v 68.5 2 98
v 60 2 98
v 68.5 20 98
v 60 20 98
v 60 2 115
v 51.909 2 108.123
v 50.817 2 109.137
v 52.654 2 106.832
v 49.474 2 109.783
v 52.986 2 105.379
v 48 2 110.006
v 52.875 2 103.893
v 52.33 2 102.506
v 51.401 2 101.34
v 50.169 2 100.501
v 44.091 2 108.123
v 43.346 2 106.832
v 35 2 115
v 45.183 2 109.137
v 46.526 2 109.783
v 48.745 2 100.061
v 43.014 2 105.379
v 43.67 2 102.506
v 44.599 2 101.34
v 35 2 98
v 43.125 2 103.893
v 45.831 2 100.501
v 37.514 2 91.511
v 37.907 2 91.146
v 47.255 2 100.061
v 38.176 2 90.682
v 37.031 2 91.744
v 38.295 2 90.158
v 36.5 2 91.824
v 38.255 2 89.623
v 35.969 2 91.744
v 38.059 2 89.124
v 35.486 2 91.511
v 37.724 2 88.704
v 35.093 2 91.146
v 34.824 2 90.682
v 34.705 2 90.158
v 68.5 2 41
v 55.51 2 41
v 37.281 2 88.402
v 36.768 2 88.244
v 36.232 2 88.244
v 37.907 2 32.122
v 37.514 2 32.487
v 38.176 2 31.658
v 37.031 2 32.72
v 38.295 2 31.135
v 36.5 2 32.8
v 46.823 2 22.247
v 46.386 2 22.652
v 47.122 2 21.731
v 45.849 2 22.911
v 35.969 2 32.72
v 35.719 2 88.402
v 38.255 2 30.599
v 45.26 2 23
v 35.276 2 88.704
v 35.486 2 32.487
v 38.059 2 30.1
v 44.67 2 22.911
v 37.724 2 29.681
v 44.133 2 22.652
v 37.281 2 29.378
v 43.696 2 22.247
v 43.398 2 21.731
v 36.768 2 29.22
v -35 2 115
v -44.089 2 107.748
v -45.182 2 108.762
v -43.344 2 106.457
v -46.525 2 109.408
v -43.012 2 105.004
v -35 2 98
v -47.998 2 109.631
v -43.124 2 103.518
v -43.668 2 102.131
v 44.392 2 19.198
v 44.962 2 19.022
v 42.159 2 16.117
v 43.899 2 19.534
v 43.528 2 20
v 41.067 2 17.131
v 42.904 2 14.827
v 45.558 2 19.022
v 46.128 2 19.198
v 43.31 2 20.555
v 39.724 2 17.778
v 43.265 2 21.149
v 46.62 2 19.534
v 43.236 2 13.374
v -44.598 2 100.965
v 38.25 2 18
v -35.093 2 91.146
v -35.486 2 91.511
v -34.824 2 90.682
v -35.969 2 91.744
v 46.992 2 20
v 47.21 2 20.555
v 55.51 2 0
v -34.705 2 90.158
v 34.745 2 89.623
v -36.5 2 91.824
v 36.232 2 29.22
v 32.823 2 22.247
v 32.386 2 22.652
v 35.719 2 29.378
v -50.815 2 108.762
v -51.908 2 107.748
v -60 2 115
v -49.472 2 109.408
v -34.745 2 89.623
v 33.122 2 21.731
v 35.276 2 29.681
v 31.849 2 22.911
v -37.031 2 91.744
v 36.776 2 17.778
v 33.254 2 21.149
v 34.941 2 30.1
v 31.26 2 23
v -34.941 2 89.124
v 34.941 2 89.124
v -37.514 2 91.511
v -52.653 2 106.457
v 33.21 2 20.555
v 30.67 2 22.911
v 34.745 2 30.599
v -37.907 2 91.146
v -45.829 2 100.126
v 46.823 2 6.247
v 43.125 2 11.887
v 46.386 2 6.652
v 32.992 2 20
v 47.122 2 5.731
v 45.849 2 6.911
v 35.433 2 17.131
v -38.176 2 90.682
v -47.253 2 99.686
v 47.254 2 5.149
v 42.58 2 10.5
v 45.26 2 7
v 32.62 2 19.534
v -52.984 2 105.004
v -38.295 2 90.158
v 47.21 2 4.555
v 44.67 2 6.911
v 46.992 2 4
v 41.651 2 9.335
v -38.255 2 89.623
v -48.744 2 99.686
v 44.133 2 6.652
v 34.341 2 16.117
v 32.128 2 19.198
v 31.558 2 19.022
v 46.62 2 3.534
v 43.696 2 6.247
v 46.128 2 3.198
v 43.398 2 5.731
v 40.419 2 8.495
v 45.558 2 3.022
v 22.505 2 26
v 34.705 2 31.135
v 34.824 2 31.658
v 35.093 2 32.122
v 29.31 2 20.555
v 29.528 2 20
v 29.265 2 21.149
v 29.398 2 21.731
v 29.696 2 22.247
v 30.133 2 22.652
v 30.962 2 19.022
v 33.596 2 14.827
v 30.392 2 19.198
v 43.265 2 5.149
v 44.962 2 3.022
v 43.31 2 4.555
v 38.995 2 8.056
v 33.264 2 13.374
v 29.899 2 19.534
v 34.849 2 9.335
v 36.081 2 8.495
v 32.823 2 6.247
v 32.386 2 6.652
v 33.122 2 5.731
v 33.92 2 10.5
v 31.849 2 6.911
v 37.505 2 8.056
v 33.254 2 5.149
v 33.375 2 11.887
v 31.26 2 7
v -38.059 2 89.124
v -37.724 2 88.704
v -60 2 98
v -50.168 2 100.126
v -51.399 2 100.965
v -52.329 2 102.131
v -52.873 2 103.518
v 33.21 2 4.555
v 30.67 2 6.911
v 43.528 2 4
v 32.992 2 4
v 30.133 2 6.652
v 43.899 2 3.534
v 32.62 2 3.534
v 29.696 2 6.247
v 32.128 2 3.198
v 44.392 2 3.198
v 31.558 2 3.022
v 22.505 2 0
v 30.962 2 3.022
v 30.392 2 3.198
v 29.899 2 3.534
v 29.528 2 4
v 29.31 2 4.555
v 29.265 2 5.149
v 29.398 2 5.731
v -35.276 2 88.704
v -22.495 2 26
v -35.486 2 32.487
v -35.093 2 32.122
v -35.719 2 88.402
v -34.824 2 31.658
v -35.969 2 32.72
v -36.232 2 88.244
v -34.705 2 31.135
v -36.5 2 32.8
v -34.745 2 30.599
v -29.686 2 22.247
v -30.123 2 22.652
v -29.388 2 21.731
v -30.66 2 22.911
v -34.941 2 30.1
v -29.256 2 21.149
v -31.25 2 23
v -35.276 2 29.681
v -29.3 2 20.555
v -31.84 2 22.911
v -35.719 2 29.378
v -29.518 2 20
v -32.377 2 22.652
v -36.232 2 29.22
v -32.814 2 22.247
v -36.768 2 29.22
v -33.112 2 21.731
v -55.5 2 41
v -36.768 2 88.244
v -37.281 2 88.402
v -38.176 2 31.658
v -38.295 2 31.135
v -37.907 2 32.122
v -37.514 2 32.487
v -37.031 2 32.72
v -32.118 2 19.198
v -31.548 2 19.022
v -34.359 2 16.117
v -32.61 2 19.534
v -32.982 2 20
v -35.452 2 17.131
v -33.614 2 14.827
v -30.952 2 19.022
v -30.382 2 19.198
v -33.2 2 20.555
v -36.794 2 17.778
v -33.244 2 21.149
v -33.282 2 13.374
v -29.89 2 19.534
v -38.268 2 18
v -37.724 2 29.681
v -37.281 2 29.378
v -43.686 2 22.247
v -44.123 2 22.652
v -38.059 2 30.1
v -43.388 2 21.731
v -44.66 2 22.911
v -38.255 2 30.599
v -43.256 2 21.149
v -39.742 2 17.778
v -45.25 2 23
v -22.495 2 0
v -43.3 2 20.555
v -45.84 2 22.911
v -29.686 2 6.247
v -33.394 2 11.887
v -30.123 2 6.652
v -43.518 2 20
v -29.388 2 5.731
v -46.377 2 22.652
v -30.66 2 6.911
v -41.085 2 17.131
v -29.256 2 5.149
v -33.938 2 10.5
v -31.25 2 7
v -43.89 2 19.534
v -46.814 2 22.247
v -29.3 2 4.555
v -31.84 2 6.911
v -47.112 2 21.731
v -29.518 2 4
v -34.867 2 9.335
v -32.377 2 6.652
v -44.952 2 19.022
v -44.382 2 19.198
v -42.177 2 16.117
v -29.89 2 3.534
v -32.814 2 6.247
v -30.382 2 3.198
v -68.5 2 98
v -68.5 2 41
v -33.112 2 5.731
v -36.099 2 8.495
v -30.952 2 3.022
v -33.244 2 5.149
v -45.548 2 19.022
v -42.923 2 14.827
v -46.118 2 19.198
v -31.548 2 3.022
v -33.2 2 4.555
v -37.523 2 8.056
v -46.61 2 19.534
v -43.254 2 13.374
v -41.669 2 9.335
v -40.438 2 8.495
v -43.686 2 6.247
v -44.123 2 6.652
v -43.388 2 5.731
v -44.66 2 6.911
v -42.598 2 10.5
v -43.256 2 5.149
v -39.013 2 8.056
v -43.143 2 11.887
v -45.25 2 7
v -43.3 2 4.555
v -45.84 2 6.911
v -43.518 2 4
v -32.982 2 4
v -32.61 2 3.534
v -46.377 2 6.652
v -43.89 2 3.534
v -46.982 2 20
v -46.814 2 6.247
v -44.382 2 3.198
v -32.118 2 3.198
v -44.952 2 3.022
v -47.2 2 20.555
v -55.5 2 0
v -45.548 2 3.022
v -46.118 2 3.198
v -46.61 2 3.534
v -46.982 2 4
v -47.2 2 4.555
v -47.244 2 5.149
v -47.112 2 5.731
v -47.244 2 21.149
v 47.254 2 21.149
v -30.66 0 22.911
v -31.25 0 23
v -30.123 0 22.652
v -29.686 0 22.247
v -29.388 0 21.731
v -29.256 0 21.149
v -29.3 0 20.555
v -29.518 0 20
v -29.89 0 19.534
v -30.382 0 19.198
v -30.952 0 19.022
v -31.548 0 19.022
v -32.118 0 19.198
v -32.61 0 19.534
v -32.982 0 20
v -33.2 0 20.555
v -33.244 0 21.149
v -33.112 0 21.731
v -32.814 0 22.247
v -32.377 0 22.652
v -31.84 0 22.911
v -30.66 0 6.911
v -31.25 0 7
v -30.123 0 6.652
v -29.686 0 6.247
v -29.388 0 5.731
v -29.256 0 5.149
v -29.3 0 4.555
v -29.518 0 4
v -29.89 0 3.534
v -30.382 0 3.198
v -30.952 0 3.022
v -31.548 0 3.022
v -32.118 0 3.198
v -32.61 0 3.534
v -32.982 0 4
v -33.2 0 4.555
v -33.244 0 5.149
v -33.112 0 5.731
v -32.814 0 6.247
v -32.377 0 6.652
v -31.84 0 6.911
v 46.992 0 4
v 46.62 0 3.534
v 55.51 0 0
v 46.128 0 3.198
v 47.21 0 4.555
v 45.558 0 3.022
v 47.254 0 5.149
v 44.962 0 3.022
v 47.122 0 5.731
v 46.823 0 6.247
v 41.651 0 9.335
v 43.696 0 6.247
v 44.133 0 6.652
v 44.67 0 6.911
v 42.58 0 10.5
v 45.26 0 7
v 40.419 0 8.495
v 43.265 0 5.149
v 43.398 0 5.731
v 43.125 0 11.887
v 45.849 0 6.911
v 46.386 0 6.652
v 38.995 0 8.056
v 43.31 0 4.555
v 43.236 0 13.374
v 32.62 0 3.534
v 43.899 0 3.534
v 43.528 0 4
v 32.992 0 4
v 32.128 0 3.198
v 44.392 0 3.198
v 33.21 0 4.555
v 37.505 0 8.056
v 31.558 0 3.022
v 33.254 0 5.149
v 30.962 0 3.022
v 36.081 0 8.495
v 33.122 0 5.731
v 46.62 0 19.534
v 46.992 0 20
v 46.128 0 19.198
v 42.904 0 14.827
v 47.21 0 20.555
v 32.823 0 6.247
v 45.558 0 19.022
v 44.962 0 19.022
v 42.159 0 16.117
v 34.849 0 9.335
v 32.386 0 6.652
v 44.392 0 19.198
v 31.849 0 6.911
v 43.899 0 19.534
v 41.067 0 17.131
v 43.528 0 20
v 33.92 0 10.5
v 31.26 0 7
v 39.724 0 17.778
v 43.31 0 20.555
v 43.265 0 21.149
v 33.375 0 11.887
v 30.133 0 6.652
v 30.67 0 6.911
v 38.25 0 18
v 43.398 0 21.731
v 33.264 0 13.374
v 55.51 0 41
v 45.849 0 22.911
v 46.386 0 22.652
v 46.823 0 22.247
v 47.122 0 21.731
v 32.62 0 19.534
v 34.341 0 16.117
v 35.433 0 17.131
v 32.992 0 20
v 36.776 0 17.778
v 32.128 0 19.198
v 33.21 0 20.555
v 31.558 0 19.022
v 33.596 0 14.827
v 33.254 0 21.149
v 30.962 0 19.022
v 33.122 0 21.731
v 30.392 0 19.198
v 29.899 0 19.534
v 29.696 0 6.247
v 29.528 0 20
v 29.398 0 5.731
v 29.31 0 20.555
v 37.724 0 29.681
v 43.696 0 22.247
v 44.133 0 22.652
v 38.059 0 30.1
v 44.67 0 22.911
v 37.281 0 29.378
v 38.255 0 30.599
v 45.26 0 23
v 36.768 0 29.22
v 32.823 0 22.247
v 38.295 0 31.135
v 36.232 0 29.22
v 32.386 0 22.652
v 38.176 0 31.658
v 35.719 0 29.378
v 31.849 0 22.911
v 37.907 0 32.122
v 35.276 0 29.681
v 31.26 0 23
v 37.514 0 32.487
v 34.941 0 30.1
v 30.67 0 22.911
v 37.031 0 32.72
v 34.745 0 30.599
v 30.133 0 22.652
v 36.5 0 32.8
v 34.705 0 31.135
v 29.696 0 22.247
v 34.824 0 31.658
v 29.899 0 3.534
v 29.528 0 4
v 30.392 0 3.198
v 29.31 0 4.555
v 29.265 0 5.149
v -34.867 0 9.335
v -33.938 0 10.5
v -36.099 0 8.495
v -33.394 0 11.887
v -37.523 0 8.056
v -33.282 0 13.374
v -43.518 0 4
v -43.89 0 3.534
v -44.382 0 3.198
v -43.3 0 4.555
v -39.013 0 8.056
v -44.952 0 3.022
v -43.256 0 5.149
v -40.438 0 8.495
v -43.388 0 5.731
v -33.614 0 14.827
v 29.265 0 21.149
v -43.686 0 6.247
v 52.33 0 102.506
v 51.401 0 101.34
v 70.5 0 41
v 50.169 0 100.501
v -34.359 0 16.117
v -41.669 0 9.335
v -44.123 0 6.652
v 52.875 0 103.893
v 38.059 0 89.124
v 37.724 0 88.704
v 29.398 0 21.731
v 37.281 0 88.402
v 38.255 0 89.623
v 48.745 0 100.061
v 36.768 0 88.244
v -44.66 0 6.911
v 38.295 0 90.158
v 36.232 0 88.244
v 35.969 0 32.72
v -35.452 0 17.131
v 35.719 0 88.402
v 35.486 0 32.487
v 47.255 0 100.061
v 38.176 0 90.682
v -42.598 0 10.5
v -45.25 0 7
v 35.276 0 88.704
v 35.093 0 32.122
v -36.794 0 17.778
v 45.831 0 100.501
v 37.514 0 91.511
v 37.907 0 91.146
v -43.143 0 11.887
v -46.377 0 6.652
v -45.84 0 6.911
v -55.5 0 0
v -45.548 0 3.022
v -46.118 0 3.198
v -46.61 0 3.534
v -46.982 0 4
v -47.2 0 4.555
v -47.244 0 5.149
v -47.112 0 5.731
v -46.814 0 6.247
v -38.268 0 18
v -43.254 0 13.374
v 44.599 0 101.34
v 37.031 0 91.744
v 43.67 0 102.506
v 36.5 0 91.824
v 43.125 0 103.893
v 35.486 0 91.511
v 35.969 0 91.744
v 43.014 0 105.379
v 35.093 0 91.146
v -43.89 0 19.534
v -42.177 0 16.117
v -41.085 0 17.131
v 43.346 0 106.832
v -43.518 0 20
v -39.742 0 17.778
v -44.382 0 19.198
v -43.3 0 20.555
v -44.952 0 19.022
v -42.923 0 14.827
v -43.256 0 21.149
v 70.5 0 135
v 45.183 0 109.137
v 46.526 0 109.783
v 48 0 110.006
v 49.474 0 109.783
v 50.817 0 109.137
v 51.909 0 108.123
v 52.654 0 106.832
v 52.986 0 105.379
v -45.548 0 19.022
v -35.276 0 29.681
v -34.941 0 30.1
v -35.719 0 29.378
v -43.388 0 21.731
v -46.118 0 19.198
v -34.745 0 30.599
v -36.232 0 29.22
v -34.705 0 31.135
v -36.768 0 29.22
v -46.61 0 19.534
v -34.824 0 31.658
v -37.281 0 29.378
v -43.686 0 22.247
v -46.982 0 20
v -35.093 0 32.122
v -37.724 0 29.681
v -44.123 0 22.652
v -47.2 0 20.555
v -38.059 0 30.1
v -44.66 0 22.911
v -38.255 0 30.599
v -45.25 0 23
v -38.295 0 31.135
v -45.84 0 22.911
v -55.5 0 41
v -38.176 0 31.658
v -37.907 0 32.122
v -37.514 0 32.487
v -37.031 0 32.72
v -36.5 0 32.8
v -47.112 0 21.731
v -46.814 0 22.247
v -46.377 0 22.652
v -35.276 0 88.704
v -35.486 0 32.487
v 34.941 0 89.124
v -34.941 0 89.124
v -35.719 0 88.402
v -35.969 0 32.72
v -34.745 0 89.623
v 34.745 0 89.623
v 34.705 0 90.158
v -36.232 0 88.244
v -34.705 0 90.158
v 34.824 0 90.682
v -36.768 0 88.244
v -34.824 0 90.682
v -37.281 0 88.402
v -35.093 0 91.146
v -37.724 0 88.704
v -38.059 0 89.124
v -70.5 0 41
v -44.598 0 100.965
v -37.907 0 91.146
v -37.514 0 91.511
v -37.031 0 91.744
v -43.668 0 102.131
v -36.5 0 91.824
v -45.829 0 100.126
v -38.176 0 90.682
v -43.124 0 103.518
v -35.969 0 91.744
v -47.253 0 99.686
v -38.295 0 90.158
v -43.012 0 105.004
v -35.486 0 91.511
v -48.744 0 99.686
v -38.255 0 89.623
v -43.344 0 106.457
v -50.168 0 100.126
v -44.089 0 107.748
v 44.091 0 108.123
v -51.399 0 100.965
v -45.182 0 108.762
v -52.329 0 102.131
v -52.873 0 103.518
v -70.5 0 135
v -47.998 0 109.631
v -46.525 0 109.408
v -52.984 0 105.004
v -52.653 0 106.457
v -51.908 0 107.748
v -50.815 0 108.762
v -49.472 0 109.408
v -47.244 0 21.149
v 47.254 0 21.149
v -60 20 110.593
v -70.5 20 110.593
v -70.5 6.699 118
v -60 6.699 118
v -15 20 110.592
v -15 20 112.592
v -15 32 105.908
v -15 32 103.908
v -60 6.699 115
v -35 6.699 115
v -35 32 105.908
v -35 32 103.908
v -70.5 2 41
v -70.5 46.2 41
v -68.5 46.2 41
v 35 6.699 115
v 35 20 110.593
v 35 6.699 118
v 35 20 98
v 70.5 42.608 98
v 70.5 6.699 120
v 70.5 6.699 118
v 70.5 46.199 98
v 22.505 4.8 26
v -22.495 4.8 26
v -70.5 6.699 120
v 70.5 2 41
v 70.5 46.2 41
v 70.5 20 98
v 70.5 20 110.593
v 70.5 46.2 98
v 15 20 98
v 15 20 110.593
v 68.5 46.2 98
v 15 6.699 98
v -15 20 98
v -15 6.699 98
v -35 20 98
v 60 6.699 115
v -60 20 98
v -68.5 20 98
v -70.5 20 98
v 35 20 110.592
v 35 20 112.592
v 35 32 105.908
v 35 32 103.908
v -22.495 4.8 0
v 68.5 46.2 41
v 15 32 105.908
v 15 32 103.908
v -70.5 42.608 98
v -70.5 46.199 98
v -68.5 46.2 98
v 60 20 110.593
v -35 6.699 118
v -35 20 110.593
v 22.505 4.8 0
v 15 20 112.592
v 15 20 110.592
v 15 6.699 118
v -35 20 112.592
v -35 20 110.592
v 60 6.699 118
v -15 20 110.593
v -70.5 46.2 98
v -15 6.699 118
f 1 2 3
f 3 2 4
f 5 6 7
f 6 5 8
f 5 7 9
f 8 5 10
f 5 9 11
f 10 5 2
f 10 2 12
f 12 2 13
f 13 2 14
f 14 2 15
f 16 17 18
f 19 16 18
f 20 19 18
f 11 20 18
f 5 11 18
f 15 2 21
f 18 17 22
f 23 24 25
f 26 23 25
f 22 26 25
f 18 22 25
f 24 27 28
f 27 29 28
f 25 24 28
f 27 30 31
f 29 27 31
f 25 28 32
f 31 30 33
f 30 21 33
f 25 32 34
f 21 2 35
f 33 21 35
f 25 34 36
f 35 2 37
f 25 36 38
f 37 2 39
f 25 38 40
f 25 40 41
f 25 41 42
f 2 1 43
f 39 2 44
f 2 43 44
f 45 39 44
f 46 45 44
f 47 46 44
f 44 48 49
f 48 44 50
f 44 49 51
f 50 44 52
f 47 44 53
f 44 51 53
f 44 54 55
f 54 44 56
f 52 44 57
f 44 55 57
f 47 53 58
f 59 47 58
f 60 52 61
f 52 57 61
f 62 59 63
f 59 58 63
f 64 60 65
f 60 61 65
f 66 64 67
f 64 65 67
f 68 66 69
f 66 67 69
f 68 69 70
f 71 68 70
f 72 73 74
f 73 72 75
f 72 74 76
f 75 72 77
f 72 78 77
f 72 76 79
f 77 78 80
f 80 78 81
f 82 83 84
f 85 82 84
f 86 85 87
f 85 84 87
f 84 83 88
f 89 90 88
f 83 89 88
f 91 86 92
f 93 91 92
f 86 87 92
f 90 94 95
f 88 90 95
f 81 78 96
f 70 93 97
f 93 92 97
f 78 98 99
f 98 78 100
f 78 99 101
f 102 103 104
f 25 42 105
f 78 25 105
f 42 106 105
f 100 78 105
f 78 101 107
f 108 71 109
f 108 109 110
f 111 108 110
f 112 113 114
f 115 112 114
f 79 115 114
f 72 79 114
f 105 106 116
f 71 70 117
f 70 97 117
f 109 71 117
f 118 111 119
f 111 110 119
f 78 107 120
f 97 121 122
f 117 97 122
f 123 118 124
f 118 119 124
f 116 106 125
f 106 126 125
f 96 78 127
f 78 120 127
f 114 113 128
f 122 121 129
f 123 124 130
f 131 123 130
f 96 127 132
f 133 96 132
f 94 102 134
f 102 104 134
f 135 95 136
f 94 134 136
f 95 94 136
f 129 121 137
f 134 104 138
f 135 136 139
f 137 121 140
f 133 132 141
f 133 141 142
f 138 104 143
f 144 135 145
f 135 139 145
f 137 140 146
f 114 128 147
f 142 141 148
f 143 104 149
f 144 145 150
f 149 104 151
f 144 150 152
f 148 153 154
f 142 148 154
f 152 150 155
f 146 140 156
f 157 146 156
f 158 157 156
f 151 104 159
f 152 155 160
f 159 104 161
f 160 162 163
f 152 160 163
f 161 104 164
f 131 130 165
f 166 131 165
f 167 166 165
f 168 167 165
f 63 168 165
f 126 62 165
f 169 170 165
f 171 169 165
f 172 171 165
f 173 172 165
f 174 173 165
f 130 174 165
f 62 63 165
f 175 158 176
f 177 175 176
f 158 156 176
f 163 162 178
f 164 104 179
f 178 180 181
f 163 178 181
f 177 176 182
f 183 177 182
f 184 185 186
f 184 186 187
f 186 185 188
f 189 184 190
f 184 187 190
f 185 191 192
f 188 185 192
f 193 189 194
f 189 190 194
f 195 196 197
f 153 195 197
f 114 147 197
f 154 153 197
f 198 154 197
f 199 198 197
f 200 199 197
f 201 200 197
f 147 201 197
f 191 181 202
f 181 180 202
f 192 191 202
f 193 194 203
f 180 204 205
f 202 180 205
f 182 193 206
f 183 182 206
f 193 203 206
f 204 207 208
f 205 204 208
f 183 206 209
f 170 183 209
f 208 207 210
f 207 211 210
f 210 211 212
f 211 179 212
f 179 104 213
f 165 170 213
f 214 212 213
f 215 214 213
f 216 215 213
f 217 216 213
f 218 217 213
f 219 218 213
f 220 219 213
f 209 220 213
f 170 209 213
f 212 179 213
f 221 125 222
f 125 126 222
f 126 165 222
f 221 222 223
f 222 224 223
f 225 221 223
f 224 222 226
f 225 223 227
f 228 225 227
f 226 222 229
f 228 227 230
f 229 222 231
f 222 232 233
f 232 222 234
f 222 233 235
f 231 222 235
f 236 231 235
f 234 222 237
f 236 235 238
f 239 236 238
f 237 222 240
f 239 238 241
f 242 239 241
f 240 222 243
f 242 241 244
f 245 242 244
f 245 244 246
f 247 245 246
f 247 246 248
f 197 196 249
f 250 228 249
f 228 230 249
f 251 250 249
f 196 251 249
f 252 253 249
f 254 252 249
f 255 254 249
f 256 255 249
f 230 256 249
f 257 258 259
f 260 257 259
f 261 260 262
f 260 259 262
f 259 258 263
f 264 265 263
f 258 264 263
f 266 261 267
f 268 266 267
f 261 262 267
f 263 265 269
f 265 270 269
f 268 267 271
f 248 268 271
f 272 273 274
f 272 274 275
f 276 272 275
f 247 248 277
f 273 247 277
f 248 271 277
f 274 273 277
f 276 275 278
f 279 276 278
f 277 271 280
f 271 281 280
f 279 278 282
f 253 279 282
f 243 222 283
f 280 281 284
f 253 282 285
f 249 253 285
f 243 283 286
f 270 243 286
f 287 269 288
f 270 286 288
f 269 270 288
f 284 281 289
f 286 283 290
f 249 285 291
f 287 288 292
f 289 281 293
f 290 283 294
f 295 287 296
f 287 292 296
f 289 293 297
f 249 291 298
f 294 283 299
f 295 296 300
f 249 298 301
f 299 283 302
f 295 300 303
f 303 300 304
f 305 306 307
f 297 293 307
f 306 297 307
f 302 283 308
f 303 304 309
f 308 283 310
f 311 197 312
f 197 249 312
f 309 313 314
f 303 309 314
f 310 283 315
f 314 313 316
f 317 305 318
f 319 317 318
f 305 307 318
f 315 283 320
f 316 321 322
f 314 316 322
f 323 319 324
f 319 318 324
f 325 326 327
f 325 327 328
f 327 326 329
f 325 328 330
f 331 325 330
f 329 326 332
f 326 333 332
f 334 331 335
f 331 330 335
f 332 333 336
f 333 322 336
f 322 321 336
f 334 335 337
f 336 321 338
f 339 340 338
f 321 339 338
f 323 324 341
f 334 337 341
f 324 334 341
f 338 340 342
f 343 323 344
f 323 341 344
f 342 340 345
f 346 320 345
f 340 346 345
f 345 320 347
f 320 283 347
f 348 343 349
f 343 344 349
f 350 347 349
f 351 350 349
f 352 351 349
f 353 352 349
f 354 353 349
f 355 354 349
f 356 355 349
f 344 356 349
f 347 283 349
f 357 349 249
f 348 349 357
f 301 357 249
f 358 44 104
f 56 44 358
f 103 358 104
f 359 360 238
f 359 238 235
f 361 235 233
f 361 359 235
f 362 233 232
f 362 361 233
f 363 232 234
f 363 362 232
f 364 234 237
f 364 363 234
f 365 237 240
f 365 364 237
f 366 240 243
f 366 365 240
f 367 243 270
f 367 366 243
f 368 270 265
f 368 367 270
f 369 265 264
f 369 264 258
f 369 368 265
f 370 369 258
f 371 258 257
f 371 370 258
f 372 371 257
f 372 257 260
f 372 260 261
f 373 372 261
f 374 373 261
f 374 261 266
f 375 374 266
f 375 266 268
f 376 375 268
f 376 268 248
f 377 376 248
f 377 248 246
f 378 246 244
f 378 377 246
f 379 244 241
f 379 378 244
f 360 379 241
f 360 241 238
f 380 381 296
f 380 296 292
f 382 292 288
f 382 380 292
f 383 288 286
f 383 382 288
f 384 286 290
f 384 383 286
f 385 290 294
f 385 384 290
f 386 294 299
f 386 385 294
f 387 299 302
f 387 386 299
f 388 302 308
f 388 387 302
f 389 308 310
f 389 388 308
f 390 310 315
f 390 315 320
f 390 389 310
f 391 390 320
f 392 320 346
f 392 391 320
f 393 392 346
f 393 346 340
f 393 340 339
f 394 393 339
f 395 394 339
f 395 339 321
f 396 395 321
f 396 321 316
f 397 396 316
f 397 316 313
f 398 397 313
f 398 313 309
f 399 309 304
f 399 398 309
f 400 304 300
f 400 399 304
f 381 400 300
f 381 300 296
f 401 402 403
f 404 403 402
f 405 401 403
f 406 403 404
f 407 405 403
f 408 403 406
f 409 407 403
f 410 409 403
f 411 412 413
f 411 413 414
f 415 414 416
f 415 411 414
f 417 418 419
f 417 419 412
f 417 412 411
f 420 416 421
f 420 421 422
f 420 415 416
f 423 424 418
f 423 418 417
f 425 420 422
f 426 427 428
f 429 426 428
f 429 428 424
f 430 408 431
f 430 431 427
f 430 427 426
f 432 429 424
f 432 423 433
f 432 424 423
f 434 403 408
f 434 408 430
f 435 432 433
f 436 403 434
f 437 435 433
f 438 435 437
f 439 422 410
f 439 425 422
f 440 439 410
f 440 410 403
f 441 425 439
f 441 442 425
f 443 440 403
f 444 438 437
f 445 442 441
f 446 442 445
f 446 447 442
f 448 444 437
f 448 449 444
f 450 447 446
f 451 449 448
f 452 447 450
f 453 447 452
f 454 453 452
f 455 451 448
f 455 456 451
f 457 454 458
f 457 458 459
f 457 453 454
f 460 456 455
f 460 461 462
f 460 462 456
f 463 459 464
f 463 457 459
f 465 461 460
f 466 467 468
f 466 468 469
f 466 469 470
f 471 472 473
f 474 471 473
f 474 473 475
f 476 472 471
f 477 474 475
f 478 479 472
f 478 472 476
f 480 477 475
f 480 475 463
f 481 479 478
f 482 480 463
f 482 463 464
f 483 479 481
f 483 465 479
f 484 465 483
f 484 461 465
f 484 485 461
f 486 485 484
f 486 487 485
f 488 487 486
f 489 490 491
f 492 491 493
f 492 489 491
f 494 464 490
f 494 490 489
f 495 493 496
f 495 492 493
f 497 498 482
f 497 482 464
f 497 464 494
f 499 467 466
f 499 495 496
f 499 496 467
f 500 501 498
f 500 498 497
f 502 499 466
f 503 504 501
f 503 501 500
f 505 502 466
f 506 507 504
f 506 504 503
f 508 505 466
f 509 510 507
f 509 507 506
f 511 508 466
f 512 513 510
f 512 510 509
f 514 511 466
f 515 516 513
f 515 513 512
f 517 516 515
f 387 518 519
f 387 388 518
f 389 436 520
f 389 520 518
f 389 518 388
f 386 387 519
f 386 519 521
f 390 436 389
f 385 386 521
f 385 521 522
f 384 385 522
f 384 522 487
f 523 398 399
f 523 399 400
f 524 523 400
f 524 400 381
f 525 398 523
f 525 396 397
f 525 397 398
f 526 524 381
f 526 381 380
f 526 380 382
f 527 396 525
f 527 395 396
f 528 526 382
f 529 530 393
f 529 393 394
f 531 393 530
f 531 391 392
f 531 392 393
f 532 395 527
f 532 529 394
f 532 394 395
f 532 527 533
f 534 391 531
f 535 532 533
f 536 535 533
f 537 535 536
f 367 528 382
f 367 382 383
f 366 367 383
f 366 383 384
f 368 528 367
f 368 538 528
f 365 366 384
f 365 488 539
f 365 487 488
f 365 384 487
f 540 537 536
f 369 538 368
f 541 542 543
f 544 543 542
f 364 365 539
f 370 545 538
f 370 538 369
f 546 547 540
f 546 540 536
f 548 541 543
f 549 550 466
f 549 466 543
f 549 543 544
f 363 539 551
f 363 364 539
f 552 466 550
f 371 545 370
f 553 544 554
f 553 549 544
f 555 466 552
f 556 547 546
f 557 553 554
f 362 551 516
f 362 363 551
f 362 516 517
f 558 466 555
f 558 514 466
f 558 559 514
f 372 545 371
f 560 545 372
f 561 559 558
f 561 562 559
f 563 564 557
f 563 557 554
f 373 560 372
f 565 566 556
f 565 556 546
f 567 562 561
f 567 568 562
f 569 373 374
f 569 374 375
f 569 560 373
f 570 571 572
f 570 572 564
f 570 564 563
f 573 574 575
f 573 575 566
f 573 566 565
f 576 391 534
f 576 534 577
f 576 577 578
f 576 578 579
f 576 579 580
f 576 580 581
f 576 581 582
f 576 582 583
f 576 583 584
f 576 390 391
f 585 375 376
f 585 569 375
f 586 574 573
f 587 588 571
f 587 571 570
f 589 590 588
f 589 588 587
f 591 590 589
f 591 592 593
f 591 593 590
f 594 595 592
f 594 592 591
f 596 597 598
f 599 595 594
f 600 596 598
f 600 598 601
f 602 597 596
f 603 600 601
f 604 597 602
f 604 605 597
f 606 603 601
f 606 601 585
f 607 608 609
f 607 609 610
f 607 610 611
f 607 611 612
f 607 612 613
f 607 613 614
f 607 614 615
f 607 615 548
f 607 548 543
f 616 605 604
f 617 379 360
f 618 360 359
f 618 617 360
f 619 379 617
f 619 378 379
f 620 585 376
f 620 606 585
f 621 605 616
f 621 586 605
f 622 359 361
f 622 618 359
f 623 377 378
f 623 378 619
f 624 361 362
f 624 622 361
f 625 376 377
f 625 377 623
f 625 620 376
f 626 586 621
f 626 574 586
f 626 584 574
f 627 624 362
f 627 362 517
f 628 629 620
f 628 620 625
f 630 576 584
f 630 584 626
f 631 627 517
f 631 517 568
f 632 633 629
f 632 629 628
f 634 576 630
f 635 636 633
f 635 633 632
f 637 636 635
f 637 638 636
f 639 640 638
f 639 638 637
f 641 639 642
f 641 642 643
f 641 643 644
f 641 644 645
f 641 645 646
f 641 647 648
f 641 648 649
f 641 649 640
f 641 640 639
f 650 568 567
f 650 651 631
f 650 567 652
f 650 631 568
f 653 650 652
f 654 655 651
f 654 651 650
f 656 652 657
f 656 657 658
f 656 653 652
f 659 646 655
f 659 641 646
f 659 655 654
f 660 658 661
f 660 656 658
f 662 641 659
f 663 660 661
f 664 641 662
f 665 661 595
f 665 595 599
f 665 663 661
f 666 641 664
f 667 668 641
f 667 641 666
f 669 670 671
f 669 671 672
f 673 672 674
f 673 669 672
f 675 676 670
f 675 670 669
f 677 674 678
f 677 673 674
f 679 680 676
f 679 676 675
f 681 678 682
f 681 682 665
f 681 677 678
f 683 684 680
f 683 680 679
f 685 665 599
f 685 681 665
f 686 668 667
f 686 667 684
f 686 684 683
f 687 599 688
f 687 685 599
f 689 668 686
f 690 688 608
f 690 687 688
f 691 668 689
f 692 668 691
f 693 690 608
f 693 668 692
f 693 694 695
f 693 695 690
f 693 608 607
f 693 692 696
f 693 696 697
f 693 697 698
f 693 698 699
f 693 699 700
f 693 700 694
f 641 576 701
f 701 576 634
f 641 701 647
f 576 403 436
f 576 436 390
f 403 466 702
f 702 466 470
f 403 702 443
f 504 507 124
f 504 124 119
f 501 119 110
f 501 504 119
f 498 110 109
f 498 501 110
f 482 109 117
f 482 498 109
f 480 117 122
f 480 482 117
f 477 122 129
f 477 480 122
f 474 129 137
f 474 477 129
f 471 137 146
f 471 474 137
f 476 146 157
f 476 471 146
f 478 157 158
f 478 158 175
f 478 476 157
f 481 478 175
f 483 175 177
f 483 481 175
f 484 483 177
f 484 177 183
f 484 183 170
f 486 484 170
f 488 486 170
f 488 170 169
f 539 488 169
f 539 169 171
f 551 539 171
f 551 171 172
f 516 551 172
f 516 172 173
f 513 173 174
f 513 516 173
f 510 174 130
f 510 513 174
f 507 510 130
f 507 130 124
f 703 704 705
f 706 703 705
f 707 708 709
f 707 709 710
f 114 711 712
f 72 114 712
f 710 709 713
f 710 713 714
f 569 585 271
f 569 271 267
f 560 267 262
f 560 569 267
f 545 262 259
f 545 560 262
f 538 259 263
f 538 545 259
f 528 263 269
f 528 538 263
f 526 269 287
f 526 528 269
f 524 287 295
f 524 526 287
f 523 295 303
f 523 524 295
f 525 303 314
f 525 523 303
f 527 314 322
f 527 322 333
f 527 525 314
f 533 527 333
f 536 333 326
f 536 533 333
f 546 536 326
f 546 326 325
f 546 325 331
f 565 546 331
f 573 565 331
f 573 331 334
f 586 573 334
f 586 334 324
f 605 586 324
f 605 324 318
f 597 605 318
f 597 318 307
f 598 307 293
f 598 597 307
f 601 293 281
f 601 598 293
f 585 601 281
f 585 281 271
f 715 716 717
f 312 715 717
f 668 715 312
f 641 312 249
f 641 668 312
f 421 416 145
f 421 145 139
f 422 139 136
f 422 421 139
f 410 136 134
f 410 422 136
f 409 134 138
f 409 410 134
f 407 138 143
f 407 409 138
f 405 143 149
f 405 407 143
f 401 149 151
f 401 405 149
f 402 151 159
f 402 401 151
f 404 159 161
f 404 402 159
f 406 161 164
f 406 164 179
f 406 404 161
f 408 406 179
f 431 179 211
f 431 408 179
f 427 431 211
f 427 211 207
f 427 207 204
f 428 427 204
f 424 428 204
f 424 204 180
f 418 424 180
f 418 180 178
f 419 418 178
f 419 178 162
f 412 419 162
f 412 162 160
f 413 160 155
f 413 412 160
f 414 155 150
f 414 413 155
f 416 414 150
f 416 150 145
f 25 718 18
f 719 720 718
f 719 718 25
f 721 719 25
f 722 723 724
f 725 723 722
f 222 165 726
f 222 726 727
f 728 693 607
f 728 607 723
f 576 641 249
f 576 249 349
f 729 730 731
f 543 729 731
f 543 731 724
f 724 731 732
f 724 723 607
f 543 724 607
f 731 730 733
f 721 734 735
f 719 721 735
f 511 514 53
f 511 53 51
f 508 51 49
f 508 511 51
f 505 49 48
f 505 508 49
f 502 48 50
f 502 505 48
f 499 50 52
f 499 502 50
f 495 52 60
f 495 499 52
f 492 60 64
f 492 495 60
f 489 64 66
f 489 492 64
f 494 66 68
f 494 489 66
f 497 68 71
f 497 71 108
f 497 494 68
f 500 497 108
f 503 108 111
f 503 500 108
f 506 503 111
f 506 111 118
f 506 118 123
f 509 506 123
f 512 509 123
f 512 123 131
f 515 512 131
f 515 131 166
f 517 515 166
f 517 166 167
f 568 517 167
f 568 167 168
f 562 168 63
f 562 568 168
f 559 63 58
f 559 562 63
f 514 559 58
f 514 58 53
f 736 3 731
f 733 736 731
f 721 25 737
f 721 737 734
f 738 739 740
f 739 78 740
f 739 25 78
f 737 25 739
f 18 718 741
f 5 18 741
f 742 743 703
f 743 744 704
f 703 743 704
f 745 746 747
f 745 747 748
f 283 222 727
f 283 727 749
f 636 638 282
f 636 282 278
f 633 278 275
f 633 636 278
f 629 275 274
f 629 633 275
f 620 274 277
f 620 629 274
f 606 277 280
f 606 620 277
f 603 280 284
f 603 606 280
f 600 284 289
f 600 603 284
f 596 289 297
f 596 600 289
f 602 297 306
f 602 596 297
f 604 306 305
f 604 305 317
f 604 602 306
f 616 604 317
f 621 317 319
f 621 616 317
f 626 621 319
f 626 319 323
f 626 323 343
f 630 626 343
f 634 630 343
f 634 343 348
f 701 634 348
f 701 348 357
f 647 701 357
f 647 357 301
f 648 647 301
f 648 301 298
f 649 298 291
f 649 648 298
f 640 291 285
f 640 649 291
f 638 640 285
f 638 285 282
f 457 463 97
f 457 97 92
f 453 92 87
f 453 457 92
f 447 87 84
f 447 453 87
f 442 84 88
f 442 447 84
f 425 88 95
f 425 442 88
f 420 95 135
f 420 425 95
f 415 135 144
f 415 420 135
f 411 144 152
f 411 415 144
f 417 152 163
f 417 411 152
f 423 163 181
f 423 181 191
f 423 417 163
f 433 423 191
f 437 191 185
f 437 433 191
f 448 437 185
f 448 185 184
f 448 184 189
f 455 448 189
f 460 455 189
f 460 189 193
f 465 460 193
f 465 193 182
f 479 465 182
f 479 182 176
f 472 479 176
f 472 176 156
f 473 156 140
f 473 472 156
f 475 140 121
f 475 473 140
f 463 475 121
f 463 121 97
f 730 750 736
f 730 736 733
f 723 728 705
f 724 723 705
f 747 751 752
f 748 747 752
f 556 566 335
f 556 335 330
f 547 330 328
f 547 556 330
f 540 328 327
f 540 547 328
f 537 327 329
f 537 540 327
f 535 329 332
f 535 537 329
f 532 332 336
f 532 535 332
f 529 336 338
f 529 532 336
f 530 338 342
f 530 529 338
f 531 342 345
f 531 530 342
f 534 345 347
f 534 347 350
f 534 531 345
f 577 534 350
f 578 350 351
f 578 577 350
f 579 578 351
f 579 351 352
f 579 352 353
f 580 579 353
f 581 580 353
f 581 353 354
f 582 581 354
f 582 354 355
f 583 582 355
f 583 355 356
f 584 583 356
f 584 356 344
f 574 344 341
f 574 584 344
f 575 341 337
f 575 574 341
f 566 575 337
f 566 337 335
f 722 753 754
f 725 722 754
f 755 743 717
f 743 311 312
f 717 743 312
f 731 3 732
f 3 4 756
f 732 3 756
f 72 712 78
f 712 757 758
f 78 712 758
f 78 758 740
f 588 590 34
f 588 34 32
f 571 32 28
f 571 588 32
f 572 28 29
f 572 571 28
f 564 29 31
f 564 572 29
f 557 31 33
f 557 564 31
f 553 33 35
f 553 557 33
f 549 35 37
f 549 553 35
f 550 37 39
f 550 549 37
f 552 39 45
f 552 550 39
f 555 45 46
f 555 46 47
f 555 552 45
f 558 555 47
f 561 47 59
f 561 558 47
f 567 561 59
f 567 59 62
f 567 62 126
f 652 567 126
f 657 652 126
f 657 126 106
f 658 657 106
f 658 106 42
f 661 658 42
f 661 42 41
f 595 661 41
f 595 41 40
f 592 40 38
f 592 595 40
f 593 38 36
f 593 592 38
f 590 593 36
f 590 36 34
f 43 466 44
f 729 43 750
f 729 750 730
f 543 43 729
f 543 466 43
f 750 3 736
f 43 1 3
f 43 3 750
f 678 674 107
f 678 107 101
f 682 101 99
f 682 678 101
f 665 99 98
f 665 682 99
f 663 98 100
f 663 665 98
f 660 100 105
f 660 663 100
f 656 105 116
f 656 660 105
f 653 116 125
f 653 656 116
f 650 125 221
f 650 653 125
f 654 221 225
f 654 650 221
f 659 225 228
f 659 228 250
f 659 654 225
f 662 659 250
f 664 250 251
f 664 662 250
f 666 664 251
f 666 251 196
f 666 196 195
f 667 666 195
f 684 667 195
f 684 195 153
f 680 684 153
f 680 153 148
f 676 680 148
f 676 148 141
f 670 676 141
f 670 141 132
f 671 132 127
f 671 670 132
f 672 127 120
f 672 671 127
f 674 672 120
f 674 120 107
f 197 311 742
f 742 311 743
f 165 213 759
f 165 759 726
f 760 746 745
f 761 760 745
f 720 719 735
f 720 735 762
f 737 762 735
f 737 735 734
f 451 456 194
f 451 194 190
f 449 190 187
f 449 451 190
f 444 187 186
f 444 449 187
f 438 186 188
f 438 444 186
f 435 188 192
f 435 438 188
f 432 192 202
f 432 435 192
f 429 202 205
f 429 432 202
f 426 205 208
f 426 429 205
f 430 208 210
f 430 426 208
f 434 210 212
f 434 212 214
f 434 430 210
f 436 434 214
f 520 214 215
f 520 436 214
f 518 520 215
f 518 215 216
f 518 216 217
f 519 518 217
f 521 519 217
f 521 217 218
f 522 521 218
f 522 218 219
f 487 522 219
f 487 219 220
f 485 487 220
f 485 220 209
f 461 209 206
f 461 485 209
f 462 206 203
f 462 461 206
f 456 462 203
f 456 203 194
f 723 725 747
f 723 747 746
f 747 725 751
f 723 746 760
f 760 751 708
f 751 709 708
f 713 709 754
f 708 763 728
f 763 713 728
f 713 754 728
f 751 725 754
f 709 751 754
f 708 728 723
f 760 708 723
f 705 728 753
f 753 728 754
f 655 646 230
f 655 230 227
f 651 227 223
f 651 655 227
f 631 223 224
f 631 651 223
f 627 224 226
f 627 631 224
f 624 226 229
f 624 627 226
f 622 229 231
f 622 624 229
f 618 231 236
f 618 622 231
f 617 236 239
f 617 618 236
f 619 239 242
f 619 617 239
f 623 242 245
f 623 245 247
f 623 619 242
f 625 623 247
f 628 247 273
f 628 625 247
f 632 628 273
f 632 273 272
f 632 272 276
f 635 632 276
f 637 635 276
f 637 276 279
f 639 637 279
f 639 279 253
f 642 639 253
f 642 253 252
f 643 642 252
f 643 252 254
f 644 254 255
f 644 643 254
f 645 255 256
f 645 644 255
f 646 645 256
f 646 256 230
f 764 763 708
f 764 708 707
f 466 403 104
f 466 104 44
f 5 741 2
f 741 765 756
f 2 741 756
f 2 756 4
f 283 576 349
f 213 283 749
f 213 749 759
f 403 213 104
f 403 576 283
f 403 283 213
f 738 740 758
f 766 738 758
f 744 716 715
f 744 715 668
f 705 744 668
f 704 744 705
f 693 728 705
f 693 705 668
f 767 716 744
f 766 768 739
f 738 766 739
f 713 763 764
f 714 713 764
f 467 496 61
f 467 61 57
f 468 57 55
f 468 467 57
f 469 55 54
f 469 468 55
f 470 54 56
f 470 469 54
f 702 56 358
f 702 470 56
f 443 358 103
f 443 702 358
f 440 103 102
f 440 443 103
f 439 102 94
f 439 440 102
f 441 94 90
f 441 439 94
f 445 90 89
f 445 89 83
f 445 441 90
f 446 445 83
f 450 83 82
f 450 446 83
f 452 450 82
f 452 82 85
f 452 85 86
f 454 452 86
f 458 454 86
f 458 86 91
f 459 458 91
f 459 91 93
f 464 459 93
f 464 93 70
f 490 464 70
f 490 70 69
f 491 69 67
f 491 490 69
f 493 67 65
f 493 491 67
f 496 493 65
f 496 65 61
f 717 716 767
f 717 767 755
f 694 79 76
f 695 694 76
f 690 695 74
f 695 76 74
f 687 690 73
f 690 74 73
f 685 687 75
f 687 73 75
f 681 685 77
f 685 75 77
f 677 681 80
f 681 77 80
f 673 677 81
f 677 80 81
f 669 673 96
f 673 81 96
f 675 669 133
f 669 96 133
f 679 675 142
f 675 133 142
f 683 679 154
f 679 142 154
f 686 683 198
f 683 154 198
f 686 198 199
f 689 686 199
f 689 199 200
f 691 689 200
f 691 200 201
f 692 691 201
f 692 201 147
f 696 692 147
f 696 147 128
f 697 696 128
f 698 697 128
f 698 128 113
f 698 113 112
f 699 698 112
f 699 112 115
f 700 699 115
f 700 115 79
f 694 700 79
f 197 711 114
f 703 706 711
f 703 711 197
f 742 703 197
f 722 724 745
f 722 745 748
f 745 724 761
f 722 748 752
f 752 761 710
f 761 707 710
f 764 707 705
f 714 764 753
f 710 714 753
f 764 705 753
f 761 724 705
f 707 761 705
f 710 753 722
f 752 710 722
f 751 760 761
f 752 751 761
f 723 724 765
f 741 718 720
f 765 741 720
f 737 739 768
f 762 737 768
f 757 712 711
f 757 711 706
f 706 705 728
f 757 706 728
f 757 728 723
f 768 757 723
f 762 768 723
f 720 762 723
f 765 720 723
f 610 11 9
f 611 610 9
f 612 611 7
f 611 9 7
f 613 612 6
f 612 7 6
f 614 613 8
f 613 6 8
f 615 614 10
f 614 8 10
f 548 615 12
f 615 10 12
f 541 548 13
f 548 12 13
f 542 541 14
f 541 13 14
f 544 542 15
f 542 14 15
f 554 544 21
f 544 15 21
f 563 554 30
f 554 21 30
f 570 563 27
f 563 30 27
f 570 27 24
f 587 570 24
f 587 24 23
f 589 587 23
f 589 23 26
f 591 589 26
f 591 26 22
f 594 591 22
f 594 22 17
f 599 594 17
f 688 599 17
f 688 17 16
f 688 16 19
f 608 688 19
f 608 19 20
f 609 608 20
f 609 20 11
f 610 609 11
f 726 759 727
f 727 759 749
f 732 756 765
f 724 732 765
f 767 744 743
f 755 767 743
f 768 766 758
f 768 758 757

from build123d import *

# Parameters (mm, degrees)
SKETCH1_R                 = 1.8
SKETCH1_R_2               = 2
SKETCH1_R_3               = 5
BOSS_EXTRUDE1_DEPTH       = 2
BOSS_EXTRUDE6_DEPTH       = 70.5
BOSS_EXTRUDE6_DEPTH_BACK  = 70.5
CUT_EXTRUDE8_DEPTH        = 15
CUT_EXTRUDE8_DEPTH_BACK   = 15
CUT_EXTRUDE9_START        = -35
CUT_EXTRUDE9_DEPTH        = 25
CUT_EXTRUDE10_START       = 35
CUT_EXTRUDE10_DEPTH       = 25
CUT_EXTRUDE11_DEPTH       = 70.5
CUT_EXTRUDE11_DEPTH_BACK  = 70.5
CUT_EXTRUDE12_START       = 115
SKETCH11_W                = 25
SKETCH11_H                = 4.698729811
CUT_EXTRUDE12_DEPTH       = 20
CUT_EXTRUDE13_START       = 4
SKETCH7_R                 = 5
CUT_EXTRUDE13_DEPTH       = 10
BOSS_EXTRUDE7_DEPTH       = 70.5
BOSS_EXTRUDE7_DEPTH_BACK  = 70.5
SKETCH15_W                = 2
SKETCH15_H                = 57.000000003
BOSS_EXTRUDE8_DEPTH       = 46.2
CUT_EXTRUDE16_START       = -15
SKETCH13_W                = 14.59259259
SKETCH13_H                = 12
CUT_EXTRUDE16_DEPTH       = 20
CUT_EXTRUDE17_START       = 15
SKETCH13_3_W              = 14.59259259
SKETCH13_3_H              = 12
CUT_EXTRUDE17_DEPTH       = 20
BOSS_EXTRUDE9_DEPTH       = 4.8
BOSS_EXTRUDE10_DEPTH      = 70.5
BOSS_EXTRUDE10_DEPTH_BACK = 70.5


with BuildPart() as part:
    # Sketch1 → Boss-Extrude1 (new body)
    with BuildSketch(Plane(origin=(0, 0, 0), x_dir=(1, 0, 0), z_dir=(0, 1, 0))):
        Polygon((-55.5, 0), (55.509756816, 0), (55.509756816, -41), (70.5, -41), (70.5, -120), (-70.5, -120), (-70.5, -41), (-55.5, -41), align=None)
        with Locations(Location((-36.5, -90.02394851, 0), (0, 0, 270))):
            Circle(SKETCH1_R, mode=Mode.SUBTRACT)
        with Locations(Location((36.5, -31, 0), (0, 0, 270))):
            Circle(SKETCH1_R, mode=Mode.SUBTRACT)
        with Locations(Location((36.5, -90.02394851, 0), (0, 0, 270))):
            Circle(SKETCH1_R, mode=Mode.SUBTRACT)
        with Locations(Location((-36.5, -31, 0), (0, 0, 270))):
            Circle(SKETCH1_R, mode=Mode.SUBTRACT)
        with Locations(Location((-45.25, -21, 0), (0, 0, 270))):
            Circle(SKETCH1_R_2, mode=Mode.SUBTRACT)
        with Locations(Location((-31.25, -21, 0), (0, 0, 270))):
            Circle(SKETCH1_R_2, mode=Mode.SUBTRACT)
        with Locations(Location((-31.25, -5, 0), (0, 0, 270))):
            Circle(SKETCH1_R_2, mode=Mode.SUBTRACT)
        with Locations(Location((-45.25, -5, 0), (0, 0, 270))):
            Circle(SKETCH1_R_2, mode=Mode.SUBTRACT)
        with Locations(Location((-38.268185647, -13, 0), (0, 0, 270))):
            Circle(SKETCH1_R_3, mode=Mode.SUBTRACT)
        with Locations(Location((31.259756816, -21, 0), (0, 0, 270))):
            Circle(SKETCH1_R_2, mode=Mode.SUBTRACT)
        with Locations(Location((45.259756816, -21, 0), (0, 0, 270))):
            Circle(SKETCH1_R_2, mode=Mode.SUBTRACT)
        with Locations(Location((45.259756816, -5, 0), (0, 0, 270))):
            Circle(SKETCH1_R_2, mode=Mode.SUBTRACT)
        with Locations(Location((31.259756816, -5, 0), (0, 0, 270))):
            Circle(SKETCH1_R_2, mode=Mode.SUBTRACT)
        with Locations(Location((38.25, -13, 0), (0, 0, 270))):
            Circle(SKETCH1_R_3, mode=Mode.SUBTRACT)
    extrude(amount=BOSS_EXTRUDE1_DEPTH)

    # Sketch2<9> → Boss-Extrude6 (add, two sides: drawn at the far end of the back side and taken through both)
    with BuildSketch(Plane(origin=(0, 0, 0), x_dir=(0, 0, -1), z_dir=(1, 0, 0)).offset(-BOSS_EXTRUDE6_DEPTH_BACK)):
        Polygon((-98.000000003, 20), (-110.592592593, 20), (-112.592592593, 20), (-120, 6.698729811), (-120, 2), (-98.000000003, 2), (-98.000000003, 6.698729811), align=None)
    extrude(amount=BOSS_EXTRUDE6_DEPTH + BOSS_EXTRUDE6_DEPTH_BACK)

    # Sketch2<15> → Cut-Extrude8 (cut, two sides: drawn at the far end of the back side and taken through both)
    with BuildSketch(Plane(origin=(0, 0, 0), x_dir=(0, 0, -1), z_dir=(1, 0, 0)).offset(-CUT_EXTRUDE8_DEPTH_BACK)):
        Polygon((-98.000000003, 20), (-110.592592593, 20), (-112.592592593, 20), (-120, 6.698729811), (-118, 6.698729811), (-98.000000003, 6.698729811), align=None)
    extrude(amount=CUT_EXTRUDE8_DEPTH + CUT_EXTRUDE8_DEPTH_BACK, mode=Mode.SUBTRACT)

    # Sketch2<17> → Cut-Extrude9 (cut)
    with BuildSketch(Plane(origin=(0, 0, 0), x_dir=(0, 0, -1), z_dir=(1, 0, 0)).offset(CUT_EXTRUDE9_START)):
        Polygon((-98.000000003, 20), (-110.592592593, 20), (-112.592592593, 20), (-120, 6.698729811), (-118, 6.698729811), (-98.000000003, 6.698729811), align=None)
    extrude(amount=-CUT_EXTRUDE9_DEPTH, mode=Mode.SUBTRACT)

    # Sketch2<18> → Cut-Extrude10 (cut)
    with BuildSketch(Plane(origin=(0, 0, 0), x_dir=(0, 0, -1), z_dir=(1, 0, 0)).offset(CUT_EXTRUDE10_START)):
        Polygon((-98.000000003, 20), (-110.592592593, 20), (-112.592592593, 20), (-120, 6.698729811), (-118, 6.698729811), (-98.000000003, 6.698729811), align=None)
    extrude(amount=CUT_EXTRUDE10_DEPTH, mode=Mode.SUBTRACT)

    # Sketch2 → Cut-Extrude11 (cut, two sides: drawn at the far end of the back side and taken through both)
    with BuildSketch(Plane(origin=(0, 0, 0), x_dir=(0, 0, -1), z_dir=(1, 0, 0)).offset(-CUT_EXTRUDE11_DEPTH_BACK)):
        Polygon((-120, 6.698729811), (-112.592592593, 20), (-110.592592593, 20), (-118, 6.698729811), align=None)
    extrude(amount=CUT_EXTRUDE11_DEPTH + CUT_EXTRUDE11_DEPTH_BACK, mode=Mode.SUBTRACT)

    # Sketch11 → Cut-Extrude12 (cut)
    with BuildSketch(Plane.XY.offset(CUT_EXTRUDE12_START)):
        with Locations((-47.5, 4.349364905)):
            Rectangle(SKETCH11_W, SKETCH11_H)
        with Locations((47.5, 4.349364905)):
            Rectangle(SKETCH11_W, SKETCH11_H)
    extrude(amount=-CUT_EXTRUDE12_DEPTH, mode=Mode.SUBTRACT)

    # Sketch7 → Cut-Extrude13 (cut)
    with BuildSketch(Plane(origin=(0, 0, 0), x_dir=(1, 0, 0), z_dir=(0, 1, 0)).offset(CUT_EXTRUDE13_START)):
        with Locations(Location((-47.998437473, -104.630567113, 0), (0, 0, 270))):
            Circle(SKETCH7_R)
        with Locations(Location((48, -105.005567113, 0), (0, 0, 270))):
            Circle(SKETCH7_R)
    extrude(amount=-CUT_EXTRUDE13_DEPTH, mode=Mode.SUBTRACT)

    # Sketch15 → Boss-Extrude8 (add)
    with BuildSketch(Plane(origin=(0, 0, 0), x_dir=(1, 0, 0), z_dir=(0, 1, 0))):
        with Locations((-69.5, -69.500000002)):
            Rectangle(SKETCH15_W, SKETCH15_H)
        with Locations((69.5, -69.500000002)):
            Rectangle(SKETCH15_W, SKETCH15_H)
    extrude(amount=BOSS_EXTRUDE8_DEPTH)

    # Sketch17 → Boss-Extrude9 (add)
    with BuildSketch(Plane(origin=(0, 0, 0), x_dir=(1, 0, 0), z_dir=(0, 1, 0))):
        Polygon((0.004878408, 0), (22.504878408, 0), (22.504878408, -26), (-22.495121592, -26), (-22.495121592, 0), align=None)
    extrude(amount=BOSS_EXTRUDE9_DEPTH)

    # Sketch2<22> → Boss-Extrude10 (add, two sides: drawn at the far end of the back side and taken through both)
    with BuildSketch(Plane(origin=(0, 0, 0), x_dir=(0, 0, -1), z_dir=(1, 0, 0)).offset(-BOSS_EXTRUDE10_DEPTH_BACK)):
        Polygon((-120, 6.698729811), (-120, 2), (-120, 0), (-135, 0), align=None)
    extrude(amount=BOSS_EXTRUDE10_DEPTH + BOSS_EXTRUDE10_DEPTH_BACK)


with BuildPart() as body_2:
    # Sketch12 → Boss-Extrude7 (new, two sides: drawn at the far end of the back side and taken through both)
    with BuildSketch(Plane(origin=(0, 0, 0), x_dir=(0, 0, -1), z_dir=(1, 0, 0)).offset(-BOSS_EXTRUDE7_DEPTH_BACK)):
        Polygon((-98.000000003, 42.607820719), (-98.000000003, 46.198729811), (-120, 6.698729811), (-118, 6.698729811), align=None)
    extrude(amount=BOSS_EXTRUDE7_DEPTH + BOSS_EXTRUDE7_DEPTH_BACK)

    # Sketch13 → Cut-Extrude16 (cut)
    with BuildSketch(Plane(origin=(0, 0, 0), x_dir=(0, 0, -1), z_dir=(1, 0, 0)).offset(CUT_EXTRUDE16_START)):
        with Locations((-105.296296298, 26)):
            Rectangle(SKETCH13_W, SKETCH13_H)
    extrude(amount=-CUT_EXTRUDE16_DEPTH, mode=Mode.SUBTRACT)

    # Sketch13<3> → Cut-Extrude17 (cut)
    with BuildSketch(Plane(origin=(0, 0, 0), x_dir=(0, 0, -1), z_dir=(1, 0, 0)).offset(CUT_EXTRUDE17_START)):
        with Locations((-105.296296298, 26)):
            Rectangle(SKETCH13_3_W, SKETCH13_3_H)
    extrude(amount=CUT_EXTRUDE17_DEPTH, mode=Mode.SUBTRACT)


solid = Compound([part.part, body_2.part])
